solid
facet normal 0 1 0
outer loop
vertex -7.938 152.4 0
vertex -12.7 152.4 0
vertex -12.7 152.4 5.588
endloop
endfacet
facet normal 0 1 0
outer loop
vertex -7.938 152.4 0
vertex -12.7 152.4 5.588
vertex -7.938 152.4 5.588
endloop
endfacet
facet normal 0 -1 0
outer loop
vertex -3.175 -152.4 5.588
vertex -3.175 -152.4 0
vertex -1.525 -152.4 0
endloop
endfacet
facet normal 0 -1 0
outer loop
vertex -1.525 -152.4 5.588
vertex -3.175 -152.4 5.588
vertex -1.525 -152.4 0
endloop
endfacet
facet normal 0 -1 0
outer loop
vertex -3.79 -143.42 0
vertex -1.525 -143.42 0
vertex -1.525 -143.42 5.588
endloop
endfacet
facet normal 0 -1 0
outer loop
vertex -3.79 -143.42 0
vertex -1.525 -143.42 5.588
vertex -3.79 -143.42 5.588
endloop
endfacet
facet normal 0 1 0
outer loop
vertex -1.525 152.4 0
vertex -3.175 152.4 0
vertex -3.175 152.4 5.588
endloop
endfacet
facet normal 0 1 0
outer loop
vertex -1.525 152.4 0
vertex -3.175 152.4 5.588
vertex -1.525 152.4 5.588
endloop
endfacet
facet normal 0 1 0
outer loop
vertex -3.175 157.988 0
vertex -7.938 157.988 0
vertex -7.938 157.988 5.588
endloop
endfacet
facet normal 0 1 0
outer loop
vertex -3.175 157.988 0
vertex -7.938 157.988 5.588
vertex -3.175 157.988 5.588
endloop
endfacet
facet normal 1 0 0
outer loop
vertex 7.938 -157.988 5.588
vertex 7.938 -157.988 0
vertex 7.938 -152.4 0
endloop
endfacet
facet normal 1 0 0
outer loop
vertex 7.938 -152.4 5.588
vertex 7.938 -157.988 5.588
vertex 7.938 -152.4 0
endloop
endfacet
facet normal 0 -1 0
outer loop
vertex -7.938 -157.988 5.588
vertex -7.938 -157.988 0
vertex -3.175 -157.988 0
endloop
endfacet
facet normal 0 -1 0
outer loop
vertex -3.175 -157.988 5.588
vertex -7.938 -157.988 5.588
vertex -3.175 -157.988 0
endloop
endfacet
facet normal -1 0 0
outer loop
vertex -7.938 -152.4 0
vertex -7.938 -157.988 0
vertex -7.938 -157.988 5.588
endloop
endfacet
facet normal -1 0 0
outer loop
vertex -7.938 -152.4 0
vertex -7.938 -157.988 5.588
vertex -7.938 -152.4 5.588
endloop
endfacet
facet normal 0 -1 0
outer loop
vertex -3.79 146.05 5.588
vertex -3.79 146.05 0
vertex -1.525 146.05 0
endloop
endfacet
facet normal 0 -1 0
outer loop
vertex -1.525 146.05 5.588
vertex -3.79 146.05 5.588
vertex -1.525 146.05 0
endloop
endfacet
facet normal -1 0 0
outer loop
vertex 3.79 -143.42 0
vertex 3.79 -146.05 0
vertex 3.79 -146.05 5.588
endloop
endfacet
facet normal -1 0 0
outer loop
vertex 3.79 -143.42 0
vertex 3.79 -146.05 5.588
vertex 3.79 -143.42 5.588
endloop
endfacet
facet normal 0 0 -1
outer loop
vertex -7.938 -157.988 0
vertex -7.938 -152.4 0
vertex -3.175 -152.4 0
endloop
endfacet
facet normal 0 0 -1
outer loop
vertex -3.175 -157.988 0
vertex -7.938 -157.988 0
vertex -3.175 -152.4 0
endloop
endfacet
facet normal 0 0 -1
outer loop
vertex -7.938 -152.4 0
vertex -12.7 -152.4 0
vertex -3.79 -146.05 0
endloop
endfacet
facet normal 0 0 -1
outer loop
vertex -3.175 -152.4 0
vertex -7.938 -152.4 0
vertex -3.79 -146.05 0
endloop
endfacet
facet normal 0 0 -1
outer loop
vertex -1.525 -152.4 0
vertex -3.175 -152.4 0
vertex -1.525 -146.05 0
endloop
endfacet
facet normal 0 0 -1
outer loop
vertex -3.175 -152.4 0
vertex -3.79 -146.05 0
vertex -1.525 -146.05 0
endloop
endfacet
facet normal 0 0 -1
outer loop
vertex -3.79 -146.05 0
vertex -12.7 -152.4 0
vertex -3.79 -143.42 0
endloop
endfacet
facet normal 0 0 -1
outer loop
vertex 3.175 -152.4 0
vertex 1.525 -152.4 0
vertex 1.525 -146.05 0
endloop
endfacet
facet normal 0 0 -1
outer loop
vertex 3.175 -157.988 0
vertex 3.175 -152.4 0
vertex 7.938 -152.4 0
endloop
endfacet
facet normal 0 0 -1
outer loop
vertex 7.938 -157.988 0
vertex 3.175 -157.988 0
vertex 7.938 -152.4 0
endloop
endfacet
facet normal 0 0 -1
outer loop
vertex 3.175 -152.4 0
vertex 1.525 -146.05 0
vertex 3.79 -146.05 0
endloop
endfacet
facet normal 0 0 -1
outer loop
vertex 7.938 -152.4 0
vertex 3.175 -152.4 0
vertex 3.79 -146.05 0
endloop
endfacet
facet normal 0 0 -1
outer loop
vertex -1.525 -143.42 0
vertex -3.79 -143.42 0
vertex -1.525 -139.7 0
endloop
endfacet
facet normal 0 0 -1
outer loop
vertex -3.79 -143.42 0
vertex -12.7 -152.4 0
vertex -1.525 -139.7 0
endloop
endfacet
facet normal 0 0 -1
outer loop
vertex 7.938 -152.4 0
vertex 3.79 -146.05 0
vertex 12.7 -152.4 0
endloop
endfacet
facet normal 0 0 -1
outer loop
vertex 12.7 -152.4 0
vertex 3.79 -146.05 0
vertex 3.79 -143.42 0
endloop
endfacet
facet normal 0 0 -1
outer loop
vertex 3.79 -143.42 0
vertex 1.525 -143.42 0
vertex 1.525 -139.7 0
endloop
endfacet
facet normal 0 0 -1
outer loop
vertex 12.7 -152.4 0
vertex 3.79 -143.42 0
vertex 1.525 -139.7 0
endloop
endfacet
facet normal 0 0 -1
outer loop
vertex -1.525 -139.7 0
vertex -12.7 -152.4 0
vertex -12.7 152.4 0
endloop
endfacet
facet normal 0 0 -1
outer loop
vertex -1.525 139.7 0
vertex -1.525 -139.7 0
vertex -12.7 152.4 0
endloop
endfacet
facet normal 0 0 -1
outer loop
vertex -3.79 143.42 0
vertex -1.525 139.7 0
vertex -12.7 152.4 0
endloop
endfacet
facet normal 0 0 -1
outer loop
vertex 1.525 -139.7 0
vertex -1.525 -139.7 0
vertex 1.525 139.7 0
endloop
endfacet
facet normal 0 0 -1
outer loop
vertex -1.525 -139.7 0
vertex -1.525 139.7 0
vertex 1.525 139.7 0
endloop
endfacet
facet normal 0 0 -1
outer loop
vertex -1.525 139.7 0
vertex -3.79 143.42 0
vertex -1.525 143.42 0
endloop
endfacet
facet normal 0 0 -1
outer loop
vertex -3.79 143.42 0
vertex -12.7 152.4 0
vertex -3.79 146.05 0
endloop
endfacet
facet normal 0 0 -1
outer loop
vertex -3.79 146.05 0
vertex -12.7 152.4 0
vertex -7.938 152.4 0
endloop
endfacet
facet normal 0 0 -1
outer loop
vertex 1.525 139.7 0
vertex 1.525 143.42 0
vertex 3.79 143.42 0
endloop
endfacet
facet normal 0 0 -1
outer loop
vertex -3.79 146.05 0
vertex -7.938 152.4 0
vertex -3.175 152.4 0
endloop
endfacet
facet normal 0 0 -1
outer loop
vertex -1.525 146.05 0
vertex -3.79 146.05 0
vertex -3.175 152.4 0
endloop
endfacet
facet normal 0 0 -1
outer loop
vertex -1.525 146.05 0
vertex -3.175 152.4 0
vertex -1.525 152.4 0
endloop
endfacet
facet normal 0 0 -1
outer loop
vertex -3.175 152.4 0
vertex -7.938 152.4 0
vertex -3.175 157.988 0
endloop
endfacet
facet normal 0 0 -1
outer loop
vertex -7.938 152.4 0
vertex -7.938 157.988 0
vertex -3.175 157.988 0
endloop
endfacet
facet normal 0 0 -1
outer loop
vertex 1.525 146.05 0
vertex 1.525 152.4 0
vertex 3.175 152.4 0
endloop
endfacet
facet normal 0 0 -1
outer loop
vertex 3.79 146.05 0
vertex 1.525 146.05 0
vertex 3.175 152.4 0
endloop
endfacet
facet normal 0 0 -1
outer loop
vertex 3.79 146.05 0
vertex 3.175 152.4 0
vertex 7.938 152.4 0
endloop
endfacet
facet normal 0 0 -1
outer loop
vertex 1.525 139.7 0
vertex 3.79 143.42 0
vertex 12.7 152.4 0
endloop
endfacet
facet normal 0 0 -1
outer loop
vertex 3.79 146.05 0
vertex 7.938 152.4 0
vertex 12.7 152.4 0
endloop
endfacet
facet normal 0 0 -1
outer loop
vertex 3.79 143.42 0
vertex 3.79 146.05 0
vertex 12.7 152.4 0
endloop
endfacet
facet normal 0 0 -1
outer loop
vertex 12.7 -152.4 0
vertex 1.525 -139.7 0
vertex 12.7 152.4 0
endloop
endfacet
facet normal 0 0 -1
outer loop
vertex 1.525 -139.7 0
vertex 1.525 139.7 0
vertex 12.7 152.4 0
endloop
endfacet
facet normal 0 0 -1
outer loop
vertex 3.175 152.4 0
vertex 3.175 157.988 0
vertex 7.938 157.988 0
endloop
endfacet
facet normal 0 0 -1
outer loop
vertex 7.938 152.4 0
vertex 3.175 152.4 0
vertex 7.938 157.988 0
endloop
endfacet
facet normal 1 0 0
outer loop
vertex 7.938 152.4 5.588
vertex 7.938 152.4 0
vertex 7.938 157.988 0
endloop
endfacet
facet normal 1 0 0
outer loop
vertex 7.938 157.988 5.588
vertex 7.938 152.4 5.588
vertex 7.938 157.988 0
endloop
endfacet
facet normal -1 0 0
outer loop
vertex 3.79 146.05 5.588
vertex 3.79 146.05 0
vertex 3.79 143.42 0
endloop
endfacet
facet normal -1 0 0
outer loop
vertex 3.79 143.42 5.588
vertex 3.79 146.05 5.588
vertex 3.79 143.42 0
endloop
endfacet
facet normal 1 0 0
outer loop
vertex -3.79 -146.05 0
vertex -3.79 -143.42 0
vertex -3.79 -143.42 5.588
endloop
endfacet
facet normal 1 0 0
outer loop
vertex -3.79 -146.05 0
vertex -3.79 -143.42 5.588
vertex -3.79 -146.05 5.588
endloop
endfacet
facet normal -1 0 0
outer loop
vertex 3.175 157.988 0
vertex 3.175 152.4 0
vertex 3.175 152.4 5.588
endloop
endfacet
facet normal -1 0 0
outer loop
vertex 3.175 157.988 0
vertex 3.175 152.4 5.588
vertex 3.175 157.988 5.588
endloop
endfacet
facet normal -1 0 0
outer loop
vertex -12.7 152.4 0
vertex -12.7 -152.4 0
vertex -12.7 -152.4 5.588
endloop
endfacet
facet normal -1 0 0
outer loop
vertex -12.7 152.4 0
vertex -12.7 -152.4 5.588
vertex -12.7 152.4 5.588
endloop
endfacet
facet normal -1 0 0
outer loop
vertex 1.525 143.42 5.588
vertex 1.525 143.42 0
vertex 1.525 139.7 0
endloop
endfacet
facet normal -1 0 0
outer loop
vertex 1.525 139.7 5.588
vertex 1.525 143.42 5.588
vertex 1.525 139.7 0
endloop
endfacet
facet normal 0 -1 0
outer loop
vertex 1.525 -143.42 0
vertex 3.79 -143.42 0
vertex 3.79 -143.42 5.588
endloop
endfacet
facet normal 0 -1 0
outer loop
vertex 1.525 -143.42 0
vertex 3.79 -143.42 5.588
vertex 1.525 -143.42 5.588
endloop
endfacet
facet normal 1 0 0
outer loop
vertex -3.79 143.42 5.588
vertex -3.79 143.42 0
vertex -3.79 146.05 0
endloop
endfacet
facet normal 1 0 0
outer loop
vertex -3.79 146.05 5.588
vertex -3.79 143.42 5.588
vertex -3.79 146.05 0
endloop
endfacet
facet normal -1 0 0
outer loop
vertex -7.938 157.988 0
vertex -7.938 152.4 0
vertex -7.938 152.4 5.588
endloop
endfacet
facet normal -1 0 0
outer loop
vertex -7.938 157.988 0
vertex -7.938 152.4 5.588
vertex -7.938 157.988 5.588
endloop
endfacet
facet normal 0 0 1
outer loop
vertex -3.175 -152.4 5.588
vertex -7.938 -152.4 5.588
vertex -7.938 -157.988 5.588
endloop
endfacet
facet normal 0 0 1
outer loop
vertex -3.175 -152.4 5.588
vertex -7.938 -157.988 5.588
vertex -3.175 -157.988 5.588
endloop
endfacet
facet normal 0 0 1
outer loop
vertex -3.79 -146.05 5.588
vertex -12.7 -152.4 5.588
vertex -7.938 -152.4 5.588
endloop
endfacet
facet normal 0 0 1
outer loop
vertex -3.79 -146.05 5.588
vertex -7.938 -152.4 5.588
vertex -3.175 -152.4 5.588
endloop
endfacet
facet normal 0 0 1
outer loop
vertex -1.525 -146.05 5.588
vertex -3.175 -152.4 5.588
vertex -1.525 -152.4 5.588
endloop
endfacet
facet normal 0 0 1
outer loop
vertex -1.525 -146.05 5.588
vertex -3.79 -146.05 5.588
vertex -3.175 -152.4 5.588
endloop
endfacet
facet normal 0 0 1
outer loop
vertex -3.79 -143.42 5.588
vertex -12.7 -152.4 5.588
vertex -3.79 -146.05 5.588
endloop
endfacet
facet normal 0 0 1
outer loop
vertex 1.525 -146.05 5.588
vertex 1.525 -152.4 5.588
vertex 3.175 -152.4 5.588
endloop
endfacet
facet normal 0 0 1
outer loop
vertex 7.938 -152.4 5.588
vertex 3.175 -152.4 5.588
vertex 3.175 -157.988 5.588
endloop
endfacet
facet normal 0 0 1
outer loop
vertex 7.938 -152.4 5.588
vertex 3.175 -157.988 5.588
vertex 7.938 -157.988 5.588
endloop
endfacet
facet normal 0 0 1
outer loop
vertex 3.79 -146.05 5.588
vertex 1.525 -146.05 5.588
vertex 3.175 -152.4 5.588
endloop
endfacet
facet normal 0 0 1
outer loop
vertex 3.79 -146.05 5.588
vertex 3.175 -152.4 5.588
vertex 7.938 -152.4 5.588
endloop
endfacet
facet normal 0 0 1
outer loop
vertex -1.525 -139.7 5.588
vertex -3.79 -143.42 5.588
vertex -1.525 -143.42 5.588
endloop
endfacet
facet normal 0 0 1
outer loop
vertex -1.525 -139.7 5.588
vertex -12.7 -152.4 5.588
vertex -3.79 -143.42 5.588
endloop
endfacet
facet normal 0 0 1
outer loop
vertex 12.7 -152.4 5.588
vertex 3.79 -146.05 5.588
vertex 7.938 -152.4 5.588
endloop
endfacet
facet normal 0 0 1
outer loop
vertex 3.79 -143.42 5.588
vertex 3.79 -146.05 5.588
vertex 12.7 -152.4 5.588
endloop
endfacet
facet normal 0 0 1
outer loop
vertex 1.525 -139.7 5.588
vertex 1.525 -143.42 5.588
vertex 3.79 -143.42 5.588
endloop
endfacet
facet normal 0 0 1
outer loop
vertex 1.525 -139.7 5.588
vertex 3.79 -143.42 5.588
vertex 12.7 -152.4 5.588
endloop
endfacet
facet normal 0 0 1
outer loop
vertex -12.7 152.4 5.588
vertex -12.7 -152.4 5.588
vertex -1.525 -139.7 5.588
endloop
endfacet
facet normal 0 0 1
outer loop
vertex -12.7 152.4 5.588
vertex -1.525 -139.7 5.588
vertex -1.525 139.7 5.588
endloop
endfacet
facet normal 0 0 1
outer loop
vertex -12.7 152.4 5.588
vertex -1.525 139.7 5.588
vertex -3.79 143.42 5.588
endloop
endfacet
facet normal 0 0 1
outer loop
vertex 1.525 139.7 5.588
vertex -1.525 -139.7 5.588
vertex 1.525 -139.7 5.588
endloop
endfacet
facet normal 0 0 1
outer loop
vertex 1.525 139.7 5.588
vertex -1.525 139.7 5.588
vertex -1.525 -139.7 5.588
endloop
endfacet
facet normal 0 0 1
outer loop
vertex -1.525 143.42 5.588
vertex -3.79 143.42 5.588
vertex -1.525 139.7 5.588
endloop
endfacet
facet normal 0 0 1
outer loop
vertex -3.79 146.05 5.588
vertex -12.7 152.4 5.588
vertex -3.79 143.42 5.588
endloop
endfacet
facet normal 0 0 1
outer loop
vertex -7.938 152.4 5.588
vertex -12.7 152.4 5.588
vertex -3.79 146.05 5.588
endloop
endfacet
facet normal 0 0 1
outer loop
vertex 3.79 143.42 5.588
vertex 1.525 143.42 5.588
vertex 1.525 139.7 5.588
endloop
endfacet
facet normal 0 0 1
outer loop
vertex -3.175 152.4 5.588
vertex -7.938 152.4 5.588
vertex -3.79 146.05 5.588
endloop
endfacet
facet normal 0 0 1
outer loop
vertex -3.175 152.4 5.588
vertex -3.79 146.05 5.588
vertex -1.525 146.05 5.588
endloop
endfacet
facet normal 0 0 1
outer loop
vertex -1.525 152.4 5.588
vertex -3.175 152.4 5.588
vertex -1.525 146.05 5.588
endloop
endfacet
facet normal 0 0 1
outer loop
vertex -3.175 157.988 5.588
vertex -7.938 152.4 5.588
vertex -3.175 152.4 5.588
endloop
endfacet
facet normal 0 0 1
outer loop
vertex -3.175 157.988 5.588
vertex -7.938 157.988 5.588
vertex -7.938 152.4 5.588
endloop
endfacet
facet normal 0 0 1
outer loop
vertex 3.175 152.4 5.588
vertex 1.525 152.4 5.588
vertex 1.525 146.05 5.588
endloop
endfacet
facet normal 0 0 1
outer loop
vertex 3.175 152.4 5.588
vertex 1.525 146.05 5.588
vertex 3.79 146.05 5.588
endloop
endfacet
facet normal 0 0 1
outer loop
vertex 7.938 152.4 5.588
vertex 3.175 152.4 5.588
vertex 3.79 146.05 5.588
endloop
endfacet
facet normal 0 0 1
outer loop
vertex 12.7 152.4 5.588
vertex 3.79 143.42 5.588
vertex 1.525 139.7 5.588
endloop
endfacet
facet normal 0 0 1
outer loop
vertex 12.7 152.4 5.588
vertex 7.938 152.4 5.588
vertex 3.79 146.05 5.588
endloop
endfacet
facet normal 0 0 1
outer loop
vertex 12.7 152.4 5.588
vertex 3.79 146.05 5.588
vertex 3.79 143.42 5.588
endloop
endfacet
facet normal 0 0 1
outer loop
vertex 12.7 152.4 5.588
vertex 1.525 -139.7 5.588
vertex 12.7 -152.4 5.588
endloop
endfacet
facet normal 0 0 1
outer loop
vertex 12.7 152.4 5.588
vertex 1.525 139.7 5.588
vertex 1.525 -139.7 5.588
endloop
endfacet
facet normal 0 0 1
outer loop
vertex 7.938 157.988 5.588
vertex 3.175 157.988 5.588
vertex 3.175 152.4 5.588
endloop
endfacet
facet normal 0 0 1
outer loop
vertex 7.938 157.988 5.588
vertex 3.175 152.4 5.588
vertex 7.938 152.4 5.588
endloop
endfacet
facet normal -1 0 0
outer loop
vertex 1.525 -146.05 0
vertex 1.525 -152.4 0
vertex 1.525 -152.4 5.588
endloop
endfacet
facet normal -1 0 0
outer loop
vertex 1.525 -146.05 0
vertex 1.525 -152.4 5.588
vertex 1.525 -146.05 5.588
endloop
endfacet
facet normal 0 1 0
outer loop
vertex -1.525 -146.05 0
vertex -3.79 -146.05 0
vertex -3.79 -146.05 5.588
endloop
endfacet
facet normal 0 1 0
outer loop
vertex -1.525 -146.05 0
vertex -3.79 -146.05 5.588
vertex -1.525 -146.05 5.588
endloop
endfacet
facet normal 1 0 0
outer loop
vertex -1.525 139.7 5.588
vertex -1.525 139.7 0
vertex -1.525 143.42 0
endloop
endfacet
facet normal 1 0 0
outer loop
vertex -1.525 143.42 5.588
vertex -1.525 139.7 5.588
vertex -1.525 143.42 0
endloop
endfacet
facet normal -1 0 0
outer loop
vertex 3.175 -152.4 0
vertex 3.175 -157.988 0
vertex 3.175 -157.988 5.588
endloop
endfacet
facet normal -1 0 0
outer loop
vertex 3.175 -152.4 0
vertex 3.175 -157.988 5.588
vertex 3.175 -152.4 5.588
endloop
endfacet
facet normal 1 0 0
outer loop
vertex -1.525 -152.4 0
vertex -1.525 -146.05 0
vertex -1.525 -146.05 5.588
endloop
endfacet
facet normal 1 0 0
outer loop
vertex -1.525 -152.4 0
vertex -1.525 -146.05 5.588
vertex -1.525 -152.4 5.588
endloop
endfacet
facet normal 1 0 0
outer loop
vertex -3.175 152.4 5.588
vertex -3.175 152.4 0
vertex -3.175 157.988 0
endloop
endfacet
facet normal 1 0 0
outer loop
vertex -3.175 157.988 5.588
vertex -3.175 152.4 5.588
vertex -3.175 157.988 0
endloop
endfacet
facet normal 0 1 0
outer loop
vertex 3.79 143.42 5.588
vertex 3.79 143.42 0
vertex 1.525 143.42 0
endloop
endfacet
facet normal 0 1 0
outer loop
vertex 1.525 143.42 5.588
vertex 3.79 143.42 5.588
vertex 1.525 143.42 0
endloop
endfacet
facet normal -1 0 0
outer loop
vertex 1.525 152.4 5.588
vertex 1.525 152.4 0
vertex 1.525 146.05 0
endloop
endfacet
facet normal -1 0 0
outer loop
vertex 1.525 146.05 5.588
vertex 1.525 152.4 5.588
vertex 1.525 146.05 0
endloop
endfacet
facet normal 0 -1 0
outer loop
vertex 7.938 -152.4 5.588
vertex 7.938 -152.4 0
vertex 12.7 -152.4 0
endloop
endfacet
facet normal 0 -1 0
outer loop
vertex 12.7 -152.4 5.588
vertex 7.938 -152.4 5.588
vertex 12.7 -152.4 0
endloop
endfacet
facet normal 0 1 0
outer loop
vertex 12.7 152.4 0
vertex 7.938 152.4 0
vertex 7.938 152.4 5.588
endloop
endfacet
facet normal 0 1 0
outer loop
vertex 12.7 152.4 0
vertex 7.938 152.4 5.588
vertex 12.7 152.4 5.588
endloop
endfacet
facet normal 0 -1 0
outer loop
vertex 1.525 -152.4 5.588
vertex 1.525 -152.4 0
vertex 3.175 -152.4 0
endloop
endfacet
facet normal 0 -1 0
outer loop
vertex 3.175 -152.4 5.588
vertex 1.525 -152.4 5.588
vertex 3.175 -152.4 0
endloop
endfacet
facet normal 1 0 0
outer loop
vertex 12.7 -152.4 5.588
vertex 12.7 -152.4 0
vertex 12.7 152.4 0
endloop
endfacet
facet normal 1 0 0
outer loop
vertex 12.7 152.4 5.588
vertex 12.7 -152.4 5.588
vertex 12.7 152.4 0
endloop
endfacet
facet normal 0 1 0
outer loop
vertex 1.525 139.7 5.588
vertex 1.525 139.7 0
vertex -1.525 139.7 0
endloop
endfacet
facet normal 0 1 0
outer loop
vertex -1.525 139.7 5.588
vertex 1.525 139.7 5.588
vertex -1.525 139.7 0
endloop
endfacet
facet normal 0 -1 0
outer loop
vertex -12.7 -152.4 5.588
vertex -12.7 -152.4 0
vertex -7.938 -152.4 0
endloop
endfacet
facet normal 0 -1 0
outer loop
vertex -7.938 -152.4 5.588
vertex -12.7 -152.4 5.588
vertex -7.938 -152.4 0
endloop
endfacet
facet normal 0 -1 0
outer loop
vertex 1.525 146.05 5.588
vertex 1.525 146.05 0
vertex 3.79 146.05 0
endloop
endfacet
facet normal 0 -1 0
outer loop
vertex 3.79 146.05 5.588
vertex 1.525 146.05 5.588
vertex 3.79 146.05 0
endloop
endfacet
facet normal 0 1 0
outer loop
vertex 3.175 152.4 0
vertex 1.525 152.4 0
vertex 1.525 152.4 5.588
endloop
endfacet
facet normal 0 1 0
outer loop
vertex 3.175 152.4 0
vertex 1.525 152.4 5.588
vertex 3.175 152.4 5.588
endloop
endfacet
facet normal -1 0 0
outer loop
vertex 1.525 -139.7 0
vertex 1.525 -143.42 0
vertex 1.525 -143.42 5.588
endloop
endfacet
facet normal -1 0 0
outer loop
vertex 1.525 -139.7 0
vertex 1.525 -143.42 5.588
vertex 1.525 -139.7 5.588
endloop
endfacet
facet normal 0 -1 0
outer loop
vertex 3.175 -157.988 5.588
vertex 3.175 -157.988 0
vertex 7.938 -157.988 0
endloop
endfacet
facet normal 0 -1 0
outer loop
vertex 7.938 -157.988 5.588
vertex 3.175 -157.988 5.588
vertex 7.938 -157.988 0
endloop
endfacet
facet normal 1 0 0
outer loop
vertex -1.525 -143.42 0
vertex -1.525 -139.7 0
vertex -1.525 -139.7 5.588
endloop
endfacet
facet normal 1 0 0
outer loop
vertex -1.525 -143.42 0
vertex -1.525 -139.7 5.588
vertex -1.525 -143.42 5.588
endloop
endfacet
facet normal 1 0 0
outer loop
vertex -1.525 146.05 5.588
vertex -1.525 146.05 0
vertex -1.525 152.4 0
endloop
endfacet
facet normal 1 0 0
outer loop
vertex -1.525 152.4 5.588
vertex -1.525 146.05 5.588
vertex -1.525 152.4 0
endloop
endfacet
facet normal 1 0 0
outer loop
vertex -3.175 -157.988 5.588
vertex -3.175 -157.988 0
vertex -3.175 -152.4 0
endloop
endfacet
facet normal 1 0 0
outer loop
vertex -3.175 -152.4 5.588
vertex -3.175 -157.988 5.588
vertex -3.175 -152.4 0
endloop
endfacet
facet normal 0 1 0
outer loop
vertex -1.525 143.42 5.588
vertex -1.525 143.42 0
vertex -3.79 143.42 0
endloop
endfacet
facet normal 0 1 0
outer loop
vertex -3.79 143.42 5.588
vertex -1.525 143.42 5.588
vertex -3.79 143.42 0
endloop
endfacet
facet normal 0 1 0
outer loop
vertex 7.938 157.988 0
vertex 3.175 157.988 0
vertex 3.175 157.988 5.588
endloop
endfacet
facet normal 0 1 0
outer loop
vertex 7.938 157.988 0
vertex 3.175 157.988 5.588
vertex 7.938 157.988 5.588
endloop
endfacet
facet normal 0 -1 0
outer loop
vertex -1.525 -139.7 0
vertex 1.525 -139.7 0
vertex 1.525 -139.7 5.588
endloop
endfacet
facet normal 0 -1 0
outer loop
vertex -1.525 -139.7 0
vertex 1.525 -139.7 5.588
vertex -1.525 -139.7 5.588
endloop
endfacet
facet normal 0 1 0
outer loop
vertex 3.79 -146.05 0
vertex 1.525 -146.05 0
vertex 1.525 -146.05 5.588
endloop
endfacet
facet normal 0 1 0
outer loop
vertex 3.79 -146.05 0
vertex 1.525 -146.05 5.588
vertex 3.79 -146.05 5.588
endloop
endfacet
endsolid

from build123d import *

# Parameters (mm, degrees)
SKETCH2_W           = 25.4
SKETCH2_H           = 315.976
BOSS_EXTRUDE1_DEPTH = 5.588
SKETCH3_W           = 4.7625
SKETCH3_H           = 5.588
SKETCH3_W_2         = 6.35
CUT_EXTRUDE2_DEPTH  = 159.596103004
CUT_EXTRUDE4_DEPTH  = 159.596103004


with BuildPart() as part:
    # Sketch2 → Boss-Extrude1 (new body)
    with BuildSketch(Plane.XY):
        Rectangle(SKETCH2_W, SKETCH2_H)
    extrude(amount=BOSS_EXTRUDE1_DEPTH)

    # Sketch3 → Cut-Extrude2 (cut, through all)
    with BuildSketch(Plane.XY):
        with Locations((-10.31875, -155.194)):
            Rectangle(SKETCH3_W, SKETCH3_H)
        with Locations((10.31875, -155.194)):
            Rectangle(SKETCH3_W, SKETCH3_H)
        with Locations((0, -155.194)):
            Rectangle(SKETCH3_W_2, SKETCH3_H)
        with Locations((-10.31875, 155.194)):
            Rectangle(SKETCH3_W, SKETCH3_H)
        with Locations((10.31875, 155.194)):
            Rectangle(SKETCH3_W, SKETCH3_H)
        with Locations((0, 155.194)):
            Rectangle(SKETCH3_W_2, SKETCH3_H)
    extrude(amount=CUT_EXTRUDE2_DEPTH, mode=Mode.SUBTRACT)

    # Sketch4 → Cut-Extrude4 (cut, through all)
    with BuildSketch(Plane.XY):
        Polygon((-1.525, -152.4), (1.525, -152.4), (1.525, -146.05), (3.79, -146.05), (3.79, -143.42), (1.525, -143.42), (1.525, -139.7), (-1.525, -139.7), (-1.525, -143.42), (-3.79, -143.42), (-3.79, -146.05), (-1.525, -146.05), align=None)
    cut_extrude4 = extrude(amount=CUT_EXTRUDE4_DEPTH, mode=Mode.SUBTRACT)

    # Mirror1: Cut-Extrude4 across plane
    add(cut_extrude4.mirror(Plane.ZX), mode=Mode.SUBTRACT)


solid = part.part
